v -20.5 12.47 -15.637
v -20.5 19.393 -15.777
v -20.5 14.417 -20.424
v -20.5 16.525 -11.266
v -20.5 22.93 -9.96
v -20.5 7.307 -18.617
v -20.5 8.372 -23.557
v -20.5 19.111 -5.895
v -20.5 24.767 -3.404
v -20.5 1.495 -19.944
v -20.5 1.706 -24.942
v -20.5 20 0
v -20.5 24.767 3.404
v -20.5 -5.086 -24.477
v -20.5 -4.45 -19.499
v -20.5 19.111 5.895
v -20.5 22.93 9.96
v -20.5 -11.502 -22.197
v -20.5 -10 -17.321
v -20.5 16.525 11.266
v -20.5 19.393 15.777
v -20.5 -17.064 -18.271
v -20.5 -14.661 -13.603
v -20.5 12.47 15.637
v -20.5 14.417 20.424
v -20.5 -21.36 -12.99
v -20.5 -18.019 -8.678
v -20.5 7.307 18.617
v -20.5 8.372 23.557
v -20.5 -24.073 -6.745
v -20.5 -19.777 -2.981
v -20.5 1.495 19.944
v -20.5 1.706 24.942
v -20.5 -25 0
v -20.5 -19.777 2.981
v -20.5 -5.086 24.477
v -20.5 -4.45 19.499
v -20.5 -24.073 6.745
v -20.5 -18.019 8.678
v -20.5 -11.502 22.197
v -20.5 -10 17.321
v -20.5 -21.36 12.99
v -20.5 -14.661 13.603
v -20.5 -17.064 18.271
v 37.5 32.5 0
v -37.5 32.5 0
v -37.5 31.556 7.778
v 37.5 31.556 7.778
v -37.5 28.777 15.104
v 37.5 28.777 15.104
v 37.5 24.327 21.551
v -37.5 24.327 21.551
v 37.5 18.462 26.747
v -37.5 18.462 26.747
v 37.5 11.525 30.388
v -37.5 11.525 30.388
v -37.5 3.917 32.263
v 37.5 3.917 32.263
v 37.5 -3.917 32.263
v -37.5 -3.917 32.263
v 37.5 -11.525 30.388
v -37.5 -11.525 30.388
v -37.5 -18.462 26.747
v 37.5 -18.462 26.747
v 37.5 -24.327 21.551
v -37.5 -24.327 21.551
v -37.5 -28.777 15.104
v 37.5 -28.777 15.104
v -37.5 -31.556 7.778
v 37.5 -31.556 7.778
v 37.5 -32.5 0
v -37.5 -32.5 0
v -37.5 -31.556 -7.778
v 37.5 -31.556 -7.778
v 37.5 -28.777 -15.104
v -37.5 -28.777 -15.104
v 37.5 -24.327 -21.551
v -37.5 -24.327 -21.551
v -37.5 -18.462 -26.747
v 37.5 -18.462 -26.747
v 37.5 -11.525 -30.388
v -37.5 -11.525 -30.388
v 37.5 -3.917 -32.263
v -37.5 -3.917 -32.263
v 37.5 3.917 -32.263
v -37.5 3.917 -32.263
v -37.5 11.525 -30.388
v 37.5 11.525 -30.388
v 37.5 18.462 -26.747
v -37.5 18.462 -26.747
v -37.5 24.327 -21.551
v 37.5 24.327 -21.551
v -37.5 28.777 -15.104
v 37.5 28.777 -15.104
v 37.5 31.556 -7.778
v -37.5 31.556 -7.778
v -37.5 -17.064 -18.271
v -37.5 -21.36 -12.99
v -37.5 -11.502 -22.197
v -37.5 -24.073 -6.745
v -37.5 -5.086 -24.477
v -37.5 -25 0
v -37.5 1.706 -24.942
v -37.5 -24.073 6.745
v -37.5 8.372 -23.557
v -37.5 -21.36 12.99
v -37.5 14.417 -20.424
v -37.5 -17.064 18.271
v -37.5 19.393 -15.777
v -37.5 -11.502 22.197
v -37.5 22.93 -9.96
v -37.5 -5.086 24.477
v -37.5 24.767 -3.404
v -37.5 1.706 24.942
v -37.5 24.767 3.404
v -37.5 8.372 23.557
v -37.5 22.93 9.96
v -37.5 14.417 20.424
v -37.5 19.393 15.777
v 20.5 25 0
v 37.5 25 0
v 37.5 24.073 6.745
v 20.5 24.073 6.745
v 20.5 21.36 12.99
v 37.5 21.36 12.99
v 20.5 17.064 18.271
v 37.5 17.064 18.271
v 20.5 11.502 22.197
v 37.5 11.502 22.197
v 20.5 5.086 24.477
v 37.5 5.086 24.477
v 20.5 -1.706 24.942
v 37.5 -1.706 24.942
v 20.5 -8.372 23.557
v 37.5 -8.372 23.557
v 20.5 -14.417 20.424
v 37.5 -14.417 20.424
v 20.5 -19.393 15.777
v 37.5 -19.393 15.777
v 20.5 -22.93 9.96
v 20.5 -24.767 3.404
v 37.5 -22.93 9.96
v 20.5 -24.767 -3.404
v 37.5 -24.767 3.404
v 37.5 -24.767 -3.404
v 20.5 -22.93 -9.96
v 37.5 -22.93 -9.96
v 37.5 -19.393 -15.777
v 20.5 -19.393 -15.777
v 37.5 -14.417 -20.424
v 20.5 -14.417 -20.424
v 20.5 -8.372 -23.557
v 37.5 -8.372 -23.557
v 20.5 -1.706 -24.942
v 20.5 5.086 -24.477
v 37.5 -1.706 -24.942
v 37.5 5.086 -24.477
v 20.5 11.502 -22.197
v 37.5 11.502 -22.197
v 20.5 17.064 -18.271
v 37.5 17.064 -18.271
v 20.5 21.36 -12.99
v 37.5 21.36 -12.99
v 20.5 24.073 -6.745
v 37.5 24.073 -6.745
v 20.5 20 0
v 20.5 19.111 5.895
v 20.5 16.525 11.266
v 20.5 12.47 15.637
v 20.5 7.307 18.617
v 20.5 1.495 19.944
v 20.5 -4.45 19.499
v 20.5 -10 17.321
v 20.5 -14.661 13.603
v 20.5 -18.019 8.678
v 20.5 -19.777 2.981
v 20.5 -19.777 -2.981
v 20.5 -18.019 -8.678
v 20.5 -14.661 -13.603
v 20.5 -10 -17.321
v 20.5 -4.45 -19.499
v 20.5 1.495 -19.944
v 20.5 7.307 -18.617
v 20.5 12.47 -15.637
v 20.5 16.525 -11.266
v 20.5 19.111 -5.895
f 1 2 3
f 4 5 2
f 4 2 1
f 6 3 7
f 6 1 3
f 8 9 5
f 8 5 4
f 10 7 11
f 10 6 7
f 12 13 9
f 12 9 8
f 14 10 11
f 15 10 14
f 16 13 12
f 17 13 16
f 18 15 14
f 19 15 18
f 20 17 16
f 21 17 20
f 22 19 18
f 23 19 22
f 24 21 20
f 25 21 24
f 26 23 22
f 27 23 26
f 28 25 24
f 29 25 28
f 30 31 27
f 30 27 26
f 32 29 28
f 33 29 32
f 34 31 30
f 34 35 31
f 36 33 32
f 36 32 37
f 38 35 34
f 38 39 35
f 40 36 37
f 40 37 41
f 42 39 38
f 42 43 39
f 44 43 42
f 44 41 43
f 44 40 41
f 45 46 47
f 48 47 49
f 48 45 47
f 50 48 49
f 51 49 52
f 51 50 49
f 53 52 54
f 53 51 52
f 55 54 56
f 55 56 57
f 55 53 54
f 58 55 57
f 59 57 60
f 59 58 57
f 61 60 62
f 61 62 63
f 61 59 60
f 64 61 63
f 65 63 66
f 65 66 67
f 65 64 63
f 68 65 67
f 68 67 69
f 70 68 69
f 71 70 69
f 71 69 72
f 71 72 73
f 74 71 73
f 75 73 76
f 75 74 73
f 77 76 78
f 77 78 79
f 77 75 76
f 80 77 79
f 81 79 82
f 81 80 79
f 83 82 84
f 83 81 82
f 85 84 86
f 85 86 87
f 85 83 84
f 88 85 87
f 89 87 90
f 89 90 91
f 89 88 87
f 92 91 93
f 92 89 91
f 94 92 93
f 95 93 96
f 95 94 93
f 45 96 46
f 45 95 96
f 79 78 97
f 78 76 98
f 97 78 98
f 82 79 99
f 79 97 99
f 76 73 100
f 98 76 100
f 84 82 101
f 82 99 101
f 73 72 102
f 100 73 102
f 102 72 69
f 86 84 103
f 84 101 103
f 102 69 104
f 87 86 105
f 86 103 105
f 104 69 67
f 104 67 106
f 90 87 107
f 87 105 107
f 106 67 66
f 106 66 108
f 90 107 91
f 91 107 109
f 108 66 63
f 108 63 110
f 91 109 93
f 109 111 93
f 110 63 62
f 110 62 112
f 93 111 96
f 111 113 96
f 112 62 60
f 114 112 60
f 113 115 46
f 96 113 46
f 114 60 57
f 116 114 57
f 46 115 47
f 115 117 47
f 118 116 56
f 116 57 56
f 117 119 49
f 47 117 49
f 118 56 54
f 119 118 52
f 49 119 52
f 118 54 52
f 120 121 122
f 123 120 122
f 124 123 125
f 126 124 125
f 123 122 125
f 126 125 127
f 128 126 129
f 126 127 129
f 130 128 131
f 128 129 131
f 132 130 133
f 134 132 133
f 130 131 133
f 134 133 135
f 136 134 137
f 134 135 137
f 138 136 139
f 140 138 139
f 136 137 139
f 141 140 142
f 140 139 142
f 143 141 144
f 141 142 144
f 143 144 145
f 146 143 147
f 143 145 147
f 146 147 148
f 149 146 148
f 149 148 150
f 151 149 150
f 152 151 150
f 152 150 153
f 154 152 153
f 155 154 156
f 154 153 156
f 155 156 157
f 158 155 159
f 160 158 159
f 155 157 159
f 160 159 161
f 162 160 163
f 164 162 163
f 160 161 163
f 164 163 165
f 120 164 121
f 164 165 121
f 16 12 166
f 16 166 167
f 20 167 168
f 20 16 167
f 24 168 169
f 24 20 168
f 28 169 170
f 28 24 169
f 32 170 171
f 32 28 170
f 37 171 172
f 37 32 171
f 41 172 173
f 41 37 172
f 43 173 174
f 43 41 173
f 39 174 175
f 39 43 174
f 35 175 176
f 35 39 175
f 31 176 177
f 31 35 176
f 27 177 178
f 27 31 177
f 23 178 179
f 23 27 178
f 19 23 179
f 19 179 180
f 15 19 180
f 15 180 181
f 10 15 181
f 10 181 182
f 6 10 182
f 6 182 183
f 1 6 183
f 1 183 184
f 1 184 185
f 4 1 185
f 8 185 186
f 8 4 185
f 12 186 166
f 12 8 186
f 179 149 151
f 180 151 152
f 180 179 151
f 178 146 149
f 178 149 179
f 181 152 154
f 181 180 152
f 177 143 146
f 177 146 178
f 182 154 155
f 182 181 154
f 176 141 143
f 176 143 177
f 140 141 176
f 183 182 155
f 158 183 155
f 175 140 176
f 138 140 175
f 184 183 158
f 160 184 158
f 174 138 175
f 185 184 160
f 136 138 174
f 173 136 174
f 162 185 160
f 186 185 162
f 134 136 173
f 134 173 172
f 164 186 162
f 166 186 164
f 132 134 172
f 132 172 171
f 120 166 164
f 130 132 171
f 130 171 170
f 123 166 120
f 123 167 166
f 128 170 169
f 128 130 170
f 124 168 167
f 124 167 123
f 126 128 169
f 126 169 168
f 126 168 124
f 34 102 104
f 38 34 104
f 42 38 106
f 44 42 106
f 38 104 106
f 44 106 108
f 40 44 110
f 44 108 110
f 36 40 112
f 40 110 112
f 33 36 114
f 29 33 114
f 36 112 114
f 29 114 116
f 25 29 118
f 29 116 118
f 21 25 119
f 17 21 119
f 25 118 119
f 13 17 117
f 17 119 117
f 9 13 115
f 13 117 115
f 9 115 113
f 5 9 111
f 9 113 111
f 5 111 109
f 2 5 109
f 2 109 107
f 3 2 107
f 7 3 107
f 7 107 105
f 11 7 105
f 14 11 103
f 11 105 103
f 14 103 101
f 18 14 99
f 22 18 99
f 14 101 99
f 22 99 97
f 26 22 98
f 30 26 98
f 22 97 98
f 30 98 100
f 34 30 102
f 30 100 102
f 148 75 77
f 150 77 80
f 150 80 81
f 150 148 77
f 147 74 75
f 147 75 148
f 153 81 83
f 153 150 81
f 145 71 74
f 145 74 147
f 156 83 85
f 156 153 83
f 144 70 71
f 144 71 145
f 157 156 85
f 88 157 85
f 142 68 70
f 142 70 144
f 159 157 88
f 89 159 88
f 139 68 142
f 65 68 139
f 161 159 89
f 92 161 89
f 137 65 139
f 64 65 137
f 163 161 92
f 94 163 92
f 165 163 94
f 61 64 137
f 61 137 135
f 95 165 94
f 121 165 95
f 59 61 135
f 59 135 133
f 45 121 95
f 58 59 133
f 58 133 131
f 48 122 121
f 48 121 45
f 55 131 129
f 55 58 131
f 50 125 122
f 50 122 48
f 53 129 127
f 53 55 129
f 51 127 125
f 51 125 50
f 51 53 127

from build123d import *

# Parameters (mm, degrees)
F0_R     = 32.5
F0_R_2   = 20
F1_DEPTH = 37.5
F2_R     = 25
F2_R_2   = 20
F3_DEPTH = 17
F4_R     = 25
F4_R_2   = 20
F5_DEPTH = 17


with BuildPart() as f1:
    # F0 (on Right) → F1 (new body, symmetric)
    with BuildSketch(Plane.YZ):
        Circle(F0_R)
        Circle(F0_R_2, mode=Mode.SUBTRACT)
    extrude(amount=F1_DEPTH, both=True)

    # F2 (on face) → F3 (cut)
    with BuildSketch(Plane.YZ.offset(37.5)):
        Circle(F2_R)
        Circle(F2_R_2, mode=Mode.SUBTRACT)
    extrude(amount=-F3_DEPTH, mode=Mode.SUBTRACT)

    # F4 (on face) → F5 (cut)
    with BuildSketch(Plane(origin=(-37.5, 0, 0), x_dir=(0, -1, 0), z_dir=(-1, 0, 0))):
        Circle(F4_R)
        Circle(F4_R_2, mode=Mode.SUBTRACT)
    extrude(amount=-F5_DEPTH, mode=Mode.SUBTRACT)


solid = f1.part
